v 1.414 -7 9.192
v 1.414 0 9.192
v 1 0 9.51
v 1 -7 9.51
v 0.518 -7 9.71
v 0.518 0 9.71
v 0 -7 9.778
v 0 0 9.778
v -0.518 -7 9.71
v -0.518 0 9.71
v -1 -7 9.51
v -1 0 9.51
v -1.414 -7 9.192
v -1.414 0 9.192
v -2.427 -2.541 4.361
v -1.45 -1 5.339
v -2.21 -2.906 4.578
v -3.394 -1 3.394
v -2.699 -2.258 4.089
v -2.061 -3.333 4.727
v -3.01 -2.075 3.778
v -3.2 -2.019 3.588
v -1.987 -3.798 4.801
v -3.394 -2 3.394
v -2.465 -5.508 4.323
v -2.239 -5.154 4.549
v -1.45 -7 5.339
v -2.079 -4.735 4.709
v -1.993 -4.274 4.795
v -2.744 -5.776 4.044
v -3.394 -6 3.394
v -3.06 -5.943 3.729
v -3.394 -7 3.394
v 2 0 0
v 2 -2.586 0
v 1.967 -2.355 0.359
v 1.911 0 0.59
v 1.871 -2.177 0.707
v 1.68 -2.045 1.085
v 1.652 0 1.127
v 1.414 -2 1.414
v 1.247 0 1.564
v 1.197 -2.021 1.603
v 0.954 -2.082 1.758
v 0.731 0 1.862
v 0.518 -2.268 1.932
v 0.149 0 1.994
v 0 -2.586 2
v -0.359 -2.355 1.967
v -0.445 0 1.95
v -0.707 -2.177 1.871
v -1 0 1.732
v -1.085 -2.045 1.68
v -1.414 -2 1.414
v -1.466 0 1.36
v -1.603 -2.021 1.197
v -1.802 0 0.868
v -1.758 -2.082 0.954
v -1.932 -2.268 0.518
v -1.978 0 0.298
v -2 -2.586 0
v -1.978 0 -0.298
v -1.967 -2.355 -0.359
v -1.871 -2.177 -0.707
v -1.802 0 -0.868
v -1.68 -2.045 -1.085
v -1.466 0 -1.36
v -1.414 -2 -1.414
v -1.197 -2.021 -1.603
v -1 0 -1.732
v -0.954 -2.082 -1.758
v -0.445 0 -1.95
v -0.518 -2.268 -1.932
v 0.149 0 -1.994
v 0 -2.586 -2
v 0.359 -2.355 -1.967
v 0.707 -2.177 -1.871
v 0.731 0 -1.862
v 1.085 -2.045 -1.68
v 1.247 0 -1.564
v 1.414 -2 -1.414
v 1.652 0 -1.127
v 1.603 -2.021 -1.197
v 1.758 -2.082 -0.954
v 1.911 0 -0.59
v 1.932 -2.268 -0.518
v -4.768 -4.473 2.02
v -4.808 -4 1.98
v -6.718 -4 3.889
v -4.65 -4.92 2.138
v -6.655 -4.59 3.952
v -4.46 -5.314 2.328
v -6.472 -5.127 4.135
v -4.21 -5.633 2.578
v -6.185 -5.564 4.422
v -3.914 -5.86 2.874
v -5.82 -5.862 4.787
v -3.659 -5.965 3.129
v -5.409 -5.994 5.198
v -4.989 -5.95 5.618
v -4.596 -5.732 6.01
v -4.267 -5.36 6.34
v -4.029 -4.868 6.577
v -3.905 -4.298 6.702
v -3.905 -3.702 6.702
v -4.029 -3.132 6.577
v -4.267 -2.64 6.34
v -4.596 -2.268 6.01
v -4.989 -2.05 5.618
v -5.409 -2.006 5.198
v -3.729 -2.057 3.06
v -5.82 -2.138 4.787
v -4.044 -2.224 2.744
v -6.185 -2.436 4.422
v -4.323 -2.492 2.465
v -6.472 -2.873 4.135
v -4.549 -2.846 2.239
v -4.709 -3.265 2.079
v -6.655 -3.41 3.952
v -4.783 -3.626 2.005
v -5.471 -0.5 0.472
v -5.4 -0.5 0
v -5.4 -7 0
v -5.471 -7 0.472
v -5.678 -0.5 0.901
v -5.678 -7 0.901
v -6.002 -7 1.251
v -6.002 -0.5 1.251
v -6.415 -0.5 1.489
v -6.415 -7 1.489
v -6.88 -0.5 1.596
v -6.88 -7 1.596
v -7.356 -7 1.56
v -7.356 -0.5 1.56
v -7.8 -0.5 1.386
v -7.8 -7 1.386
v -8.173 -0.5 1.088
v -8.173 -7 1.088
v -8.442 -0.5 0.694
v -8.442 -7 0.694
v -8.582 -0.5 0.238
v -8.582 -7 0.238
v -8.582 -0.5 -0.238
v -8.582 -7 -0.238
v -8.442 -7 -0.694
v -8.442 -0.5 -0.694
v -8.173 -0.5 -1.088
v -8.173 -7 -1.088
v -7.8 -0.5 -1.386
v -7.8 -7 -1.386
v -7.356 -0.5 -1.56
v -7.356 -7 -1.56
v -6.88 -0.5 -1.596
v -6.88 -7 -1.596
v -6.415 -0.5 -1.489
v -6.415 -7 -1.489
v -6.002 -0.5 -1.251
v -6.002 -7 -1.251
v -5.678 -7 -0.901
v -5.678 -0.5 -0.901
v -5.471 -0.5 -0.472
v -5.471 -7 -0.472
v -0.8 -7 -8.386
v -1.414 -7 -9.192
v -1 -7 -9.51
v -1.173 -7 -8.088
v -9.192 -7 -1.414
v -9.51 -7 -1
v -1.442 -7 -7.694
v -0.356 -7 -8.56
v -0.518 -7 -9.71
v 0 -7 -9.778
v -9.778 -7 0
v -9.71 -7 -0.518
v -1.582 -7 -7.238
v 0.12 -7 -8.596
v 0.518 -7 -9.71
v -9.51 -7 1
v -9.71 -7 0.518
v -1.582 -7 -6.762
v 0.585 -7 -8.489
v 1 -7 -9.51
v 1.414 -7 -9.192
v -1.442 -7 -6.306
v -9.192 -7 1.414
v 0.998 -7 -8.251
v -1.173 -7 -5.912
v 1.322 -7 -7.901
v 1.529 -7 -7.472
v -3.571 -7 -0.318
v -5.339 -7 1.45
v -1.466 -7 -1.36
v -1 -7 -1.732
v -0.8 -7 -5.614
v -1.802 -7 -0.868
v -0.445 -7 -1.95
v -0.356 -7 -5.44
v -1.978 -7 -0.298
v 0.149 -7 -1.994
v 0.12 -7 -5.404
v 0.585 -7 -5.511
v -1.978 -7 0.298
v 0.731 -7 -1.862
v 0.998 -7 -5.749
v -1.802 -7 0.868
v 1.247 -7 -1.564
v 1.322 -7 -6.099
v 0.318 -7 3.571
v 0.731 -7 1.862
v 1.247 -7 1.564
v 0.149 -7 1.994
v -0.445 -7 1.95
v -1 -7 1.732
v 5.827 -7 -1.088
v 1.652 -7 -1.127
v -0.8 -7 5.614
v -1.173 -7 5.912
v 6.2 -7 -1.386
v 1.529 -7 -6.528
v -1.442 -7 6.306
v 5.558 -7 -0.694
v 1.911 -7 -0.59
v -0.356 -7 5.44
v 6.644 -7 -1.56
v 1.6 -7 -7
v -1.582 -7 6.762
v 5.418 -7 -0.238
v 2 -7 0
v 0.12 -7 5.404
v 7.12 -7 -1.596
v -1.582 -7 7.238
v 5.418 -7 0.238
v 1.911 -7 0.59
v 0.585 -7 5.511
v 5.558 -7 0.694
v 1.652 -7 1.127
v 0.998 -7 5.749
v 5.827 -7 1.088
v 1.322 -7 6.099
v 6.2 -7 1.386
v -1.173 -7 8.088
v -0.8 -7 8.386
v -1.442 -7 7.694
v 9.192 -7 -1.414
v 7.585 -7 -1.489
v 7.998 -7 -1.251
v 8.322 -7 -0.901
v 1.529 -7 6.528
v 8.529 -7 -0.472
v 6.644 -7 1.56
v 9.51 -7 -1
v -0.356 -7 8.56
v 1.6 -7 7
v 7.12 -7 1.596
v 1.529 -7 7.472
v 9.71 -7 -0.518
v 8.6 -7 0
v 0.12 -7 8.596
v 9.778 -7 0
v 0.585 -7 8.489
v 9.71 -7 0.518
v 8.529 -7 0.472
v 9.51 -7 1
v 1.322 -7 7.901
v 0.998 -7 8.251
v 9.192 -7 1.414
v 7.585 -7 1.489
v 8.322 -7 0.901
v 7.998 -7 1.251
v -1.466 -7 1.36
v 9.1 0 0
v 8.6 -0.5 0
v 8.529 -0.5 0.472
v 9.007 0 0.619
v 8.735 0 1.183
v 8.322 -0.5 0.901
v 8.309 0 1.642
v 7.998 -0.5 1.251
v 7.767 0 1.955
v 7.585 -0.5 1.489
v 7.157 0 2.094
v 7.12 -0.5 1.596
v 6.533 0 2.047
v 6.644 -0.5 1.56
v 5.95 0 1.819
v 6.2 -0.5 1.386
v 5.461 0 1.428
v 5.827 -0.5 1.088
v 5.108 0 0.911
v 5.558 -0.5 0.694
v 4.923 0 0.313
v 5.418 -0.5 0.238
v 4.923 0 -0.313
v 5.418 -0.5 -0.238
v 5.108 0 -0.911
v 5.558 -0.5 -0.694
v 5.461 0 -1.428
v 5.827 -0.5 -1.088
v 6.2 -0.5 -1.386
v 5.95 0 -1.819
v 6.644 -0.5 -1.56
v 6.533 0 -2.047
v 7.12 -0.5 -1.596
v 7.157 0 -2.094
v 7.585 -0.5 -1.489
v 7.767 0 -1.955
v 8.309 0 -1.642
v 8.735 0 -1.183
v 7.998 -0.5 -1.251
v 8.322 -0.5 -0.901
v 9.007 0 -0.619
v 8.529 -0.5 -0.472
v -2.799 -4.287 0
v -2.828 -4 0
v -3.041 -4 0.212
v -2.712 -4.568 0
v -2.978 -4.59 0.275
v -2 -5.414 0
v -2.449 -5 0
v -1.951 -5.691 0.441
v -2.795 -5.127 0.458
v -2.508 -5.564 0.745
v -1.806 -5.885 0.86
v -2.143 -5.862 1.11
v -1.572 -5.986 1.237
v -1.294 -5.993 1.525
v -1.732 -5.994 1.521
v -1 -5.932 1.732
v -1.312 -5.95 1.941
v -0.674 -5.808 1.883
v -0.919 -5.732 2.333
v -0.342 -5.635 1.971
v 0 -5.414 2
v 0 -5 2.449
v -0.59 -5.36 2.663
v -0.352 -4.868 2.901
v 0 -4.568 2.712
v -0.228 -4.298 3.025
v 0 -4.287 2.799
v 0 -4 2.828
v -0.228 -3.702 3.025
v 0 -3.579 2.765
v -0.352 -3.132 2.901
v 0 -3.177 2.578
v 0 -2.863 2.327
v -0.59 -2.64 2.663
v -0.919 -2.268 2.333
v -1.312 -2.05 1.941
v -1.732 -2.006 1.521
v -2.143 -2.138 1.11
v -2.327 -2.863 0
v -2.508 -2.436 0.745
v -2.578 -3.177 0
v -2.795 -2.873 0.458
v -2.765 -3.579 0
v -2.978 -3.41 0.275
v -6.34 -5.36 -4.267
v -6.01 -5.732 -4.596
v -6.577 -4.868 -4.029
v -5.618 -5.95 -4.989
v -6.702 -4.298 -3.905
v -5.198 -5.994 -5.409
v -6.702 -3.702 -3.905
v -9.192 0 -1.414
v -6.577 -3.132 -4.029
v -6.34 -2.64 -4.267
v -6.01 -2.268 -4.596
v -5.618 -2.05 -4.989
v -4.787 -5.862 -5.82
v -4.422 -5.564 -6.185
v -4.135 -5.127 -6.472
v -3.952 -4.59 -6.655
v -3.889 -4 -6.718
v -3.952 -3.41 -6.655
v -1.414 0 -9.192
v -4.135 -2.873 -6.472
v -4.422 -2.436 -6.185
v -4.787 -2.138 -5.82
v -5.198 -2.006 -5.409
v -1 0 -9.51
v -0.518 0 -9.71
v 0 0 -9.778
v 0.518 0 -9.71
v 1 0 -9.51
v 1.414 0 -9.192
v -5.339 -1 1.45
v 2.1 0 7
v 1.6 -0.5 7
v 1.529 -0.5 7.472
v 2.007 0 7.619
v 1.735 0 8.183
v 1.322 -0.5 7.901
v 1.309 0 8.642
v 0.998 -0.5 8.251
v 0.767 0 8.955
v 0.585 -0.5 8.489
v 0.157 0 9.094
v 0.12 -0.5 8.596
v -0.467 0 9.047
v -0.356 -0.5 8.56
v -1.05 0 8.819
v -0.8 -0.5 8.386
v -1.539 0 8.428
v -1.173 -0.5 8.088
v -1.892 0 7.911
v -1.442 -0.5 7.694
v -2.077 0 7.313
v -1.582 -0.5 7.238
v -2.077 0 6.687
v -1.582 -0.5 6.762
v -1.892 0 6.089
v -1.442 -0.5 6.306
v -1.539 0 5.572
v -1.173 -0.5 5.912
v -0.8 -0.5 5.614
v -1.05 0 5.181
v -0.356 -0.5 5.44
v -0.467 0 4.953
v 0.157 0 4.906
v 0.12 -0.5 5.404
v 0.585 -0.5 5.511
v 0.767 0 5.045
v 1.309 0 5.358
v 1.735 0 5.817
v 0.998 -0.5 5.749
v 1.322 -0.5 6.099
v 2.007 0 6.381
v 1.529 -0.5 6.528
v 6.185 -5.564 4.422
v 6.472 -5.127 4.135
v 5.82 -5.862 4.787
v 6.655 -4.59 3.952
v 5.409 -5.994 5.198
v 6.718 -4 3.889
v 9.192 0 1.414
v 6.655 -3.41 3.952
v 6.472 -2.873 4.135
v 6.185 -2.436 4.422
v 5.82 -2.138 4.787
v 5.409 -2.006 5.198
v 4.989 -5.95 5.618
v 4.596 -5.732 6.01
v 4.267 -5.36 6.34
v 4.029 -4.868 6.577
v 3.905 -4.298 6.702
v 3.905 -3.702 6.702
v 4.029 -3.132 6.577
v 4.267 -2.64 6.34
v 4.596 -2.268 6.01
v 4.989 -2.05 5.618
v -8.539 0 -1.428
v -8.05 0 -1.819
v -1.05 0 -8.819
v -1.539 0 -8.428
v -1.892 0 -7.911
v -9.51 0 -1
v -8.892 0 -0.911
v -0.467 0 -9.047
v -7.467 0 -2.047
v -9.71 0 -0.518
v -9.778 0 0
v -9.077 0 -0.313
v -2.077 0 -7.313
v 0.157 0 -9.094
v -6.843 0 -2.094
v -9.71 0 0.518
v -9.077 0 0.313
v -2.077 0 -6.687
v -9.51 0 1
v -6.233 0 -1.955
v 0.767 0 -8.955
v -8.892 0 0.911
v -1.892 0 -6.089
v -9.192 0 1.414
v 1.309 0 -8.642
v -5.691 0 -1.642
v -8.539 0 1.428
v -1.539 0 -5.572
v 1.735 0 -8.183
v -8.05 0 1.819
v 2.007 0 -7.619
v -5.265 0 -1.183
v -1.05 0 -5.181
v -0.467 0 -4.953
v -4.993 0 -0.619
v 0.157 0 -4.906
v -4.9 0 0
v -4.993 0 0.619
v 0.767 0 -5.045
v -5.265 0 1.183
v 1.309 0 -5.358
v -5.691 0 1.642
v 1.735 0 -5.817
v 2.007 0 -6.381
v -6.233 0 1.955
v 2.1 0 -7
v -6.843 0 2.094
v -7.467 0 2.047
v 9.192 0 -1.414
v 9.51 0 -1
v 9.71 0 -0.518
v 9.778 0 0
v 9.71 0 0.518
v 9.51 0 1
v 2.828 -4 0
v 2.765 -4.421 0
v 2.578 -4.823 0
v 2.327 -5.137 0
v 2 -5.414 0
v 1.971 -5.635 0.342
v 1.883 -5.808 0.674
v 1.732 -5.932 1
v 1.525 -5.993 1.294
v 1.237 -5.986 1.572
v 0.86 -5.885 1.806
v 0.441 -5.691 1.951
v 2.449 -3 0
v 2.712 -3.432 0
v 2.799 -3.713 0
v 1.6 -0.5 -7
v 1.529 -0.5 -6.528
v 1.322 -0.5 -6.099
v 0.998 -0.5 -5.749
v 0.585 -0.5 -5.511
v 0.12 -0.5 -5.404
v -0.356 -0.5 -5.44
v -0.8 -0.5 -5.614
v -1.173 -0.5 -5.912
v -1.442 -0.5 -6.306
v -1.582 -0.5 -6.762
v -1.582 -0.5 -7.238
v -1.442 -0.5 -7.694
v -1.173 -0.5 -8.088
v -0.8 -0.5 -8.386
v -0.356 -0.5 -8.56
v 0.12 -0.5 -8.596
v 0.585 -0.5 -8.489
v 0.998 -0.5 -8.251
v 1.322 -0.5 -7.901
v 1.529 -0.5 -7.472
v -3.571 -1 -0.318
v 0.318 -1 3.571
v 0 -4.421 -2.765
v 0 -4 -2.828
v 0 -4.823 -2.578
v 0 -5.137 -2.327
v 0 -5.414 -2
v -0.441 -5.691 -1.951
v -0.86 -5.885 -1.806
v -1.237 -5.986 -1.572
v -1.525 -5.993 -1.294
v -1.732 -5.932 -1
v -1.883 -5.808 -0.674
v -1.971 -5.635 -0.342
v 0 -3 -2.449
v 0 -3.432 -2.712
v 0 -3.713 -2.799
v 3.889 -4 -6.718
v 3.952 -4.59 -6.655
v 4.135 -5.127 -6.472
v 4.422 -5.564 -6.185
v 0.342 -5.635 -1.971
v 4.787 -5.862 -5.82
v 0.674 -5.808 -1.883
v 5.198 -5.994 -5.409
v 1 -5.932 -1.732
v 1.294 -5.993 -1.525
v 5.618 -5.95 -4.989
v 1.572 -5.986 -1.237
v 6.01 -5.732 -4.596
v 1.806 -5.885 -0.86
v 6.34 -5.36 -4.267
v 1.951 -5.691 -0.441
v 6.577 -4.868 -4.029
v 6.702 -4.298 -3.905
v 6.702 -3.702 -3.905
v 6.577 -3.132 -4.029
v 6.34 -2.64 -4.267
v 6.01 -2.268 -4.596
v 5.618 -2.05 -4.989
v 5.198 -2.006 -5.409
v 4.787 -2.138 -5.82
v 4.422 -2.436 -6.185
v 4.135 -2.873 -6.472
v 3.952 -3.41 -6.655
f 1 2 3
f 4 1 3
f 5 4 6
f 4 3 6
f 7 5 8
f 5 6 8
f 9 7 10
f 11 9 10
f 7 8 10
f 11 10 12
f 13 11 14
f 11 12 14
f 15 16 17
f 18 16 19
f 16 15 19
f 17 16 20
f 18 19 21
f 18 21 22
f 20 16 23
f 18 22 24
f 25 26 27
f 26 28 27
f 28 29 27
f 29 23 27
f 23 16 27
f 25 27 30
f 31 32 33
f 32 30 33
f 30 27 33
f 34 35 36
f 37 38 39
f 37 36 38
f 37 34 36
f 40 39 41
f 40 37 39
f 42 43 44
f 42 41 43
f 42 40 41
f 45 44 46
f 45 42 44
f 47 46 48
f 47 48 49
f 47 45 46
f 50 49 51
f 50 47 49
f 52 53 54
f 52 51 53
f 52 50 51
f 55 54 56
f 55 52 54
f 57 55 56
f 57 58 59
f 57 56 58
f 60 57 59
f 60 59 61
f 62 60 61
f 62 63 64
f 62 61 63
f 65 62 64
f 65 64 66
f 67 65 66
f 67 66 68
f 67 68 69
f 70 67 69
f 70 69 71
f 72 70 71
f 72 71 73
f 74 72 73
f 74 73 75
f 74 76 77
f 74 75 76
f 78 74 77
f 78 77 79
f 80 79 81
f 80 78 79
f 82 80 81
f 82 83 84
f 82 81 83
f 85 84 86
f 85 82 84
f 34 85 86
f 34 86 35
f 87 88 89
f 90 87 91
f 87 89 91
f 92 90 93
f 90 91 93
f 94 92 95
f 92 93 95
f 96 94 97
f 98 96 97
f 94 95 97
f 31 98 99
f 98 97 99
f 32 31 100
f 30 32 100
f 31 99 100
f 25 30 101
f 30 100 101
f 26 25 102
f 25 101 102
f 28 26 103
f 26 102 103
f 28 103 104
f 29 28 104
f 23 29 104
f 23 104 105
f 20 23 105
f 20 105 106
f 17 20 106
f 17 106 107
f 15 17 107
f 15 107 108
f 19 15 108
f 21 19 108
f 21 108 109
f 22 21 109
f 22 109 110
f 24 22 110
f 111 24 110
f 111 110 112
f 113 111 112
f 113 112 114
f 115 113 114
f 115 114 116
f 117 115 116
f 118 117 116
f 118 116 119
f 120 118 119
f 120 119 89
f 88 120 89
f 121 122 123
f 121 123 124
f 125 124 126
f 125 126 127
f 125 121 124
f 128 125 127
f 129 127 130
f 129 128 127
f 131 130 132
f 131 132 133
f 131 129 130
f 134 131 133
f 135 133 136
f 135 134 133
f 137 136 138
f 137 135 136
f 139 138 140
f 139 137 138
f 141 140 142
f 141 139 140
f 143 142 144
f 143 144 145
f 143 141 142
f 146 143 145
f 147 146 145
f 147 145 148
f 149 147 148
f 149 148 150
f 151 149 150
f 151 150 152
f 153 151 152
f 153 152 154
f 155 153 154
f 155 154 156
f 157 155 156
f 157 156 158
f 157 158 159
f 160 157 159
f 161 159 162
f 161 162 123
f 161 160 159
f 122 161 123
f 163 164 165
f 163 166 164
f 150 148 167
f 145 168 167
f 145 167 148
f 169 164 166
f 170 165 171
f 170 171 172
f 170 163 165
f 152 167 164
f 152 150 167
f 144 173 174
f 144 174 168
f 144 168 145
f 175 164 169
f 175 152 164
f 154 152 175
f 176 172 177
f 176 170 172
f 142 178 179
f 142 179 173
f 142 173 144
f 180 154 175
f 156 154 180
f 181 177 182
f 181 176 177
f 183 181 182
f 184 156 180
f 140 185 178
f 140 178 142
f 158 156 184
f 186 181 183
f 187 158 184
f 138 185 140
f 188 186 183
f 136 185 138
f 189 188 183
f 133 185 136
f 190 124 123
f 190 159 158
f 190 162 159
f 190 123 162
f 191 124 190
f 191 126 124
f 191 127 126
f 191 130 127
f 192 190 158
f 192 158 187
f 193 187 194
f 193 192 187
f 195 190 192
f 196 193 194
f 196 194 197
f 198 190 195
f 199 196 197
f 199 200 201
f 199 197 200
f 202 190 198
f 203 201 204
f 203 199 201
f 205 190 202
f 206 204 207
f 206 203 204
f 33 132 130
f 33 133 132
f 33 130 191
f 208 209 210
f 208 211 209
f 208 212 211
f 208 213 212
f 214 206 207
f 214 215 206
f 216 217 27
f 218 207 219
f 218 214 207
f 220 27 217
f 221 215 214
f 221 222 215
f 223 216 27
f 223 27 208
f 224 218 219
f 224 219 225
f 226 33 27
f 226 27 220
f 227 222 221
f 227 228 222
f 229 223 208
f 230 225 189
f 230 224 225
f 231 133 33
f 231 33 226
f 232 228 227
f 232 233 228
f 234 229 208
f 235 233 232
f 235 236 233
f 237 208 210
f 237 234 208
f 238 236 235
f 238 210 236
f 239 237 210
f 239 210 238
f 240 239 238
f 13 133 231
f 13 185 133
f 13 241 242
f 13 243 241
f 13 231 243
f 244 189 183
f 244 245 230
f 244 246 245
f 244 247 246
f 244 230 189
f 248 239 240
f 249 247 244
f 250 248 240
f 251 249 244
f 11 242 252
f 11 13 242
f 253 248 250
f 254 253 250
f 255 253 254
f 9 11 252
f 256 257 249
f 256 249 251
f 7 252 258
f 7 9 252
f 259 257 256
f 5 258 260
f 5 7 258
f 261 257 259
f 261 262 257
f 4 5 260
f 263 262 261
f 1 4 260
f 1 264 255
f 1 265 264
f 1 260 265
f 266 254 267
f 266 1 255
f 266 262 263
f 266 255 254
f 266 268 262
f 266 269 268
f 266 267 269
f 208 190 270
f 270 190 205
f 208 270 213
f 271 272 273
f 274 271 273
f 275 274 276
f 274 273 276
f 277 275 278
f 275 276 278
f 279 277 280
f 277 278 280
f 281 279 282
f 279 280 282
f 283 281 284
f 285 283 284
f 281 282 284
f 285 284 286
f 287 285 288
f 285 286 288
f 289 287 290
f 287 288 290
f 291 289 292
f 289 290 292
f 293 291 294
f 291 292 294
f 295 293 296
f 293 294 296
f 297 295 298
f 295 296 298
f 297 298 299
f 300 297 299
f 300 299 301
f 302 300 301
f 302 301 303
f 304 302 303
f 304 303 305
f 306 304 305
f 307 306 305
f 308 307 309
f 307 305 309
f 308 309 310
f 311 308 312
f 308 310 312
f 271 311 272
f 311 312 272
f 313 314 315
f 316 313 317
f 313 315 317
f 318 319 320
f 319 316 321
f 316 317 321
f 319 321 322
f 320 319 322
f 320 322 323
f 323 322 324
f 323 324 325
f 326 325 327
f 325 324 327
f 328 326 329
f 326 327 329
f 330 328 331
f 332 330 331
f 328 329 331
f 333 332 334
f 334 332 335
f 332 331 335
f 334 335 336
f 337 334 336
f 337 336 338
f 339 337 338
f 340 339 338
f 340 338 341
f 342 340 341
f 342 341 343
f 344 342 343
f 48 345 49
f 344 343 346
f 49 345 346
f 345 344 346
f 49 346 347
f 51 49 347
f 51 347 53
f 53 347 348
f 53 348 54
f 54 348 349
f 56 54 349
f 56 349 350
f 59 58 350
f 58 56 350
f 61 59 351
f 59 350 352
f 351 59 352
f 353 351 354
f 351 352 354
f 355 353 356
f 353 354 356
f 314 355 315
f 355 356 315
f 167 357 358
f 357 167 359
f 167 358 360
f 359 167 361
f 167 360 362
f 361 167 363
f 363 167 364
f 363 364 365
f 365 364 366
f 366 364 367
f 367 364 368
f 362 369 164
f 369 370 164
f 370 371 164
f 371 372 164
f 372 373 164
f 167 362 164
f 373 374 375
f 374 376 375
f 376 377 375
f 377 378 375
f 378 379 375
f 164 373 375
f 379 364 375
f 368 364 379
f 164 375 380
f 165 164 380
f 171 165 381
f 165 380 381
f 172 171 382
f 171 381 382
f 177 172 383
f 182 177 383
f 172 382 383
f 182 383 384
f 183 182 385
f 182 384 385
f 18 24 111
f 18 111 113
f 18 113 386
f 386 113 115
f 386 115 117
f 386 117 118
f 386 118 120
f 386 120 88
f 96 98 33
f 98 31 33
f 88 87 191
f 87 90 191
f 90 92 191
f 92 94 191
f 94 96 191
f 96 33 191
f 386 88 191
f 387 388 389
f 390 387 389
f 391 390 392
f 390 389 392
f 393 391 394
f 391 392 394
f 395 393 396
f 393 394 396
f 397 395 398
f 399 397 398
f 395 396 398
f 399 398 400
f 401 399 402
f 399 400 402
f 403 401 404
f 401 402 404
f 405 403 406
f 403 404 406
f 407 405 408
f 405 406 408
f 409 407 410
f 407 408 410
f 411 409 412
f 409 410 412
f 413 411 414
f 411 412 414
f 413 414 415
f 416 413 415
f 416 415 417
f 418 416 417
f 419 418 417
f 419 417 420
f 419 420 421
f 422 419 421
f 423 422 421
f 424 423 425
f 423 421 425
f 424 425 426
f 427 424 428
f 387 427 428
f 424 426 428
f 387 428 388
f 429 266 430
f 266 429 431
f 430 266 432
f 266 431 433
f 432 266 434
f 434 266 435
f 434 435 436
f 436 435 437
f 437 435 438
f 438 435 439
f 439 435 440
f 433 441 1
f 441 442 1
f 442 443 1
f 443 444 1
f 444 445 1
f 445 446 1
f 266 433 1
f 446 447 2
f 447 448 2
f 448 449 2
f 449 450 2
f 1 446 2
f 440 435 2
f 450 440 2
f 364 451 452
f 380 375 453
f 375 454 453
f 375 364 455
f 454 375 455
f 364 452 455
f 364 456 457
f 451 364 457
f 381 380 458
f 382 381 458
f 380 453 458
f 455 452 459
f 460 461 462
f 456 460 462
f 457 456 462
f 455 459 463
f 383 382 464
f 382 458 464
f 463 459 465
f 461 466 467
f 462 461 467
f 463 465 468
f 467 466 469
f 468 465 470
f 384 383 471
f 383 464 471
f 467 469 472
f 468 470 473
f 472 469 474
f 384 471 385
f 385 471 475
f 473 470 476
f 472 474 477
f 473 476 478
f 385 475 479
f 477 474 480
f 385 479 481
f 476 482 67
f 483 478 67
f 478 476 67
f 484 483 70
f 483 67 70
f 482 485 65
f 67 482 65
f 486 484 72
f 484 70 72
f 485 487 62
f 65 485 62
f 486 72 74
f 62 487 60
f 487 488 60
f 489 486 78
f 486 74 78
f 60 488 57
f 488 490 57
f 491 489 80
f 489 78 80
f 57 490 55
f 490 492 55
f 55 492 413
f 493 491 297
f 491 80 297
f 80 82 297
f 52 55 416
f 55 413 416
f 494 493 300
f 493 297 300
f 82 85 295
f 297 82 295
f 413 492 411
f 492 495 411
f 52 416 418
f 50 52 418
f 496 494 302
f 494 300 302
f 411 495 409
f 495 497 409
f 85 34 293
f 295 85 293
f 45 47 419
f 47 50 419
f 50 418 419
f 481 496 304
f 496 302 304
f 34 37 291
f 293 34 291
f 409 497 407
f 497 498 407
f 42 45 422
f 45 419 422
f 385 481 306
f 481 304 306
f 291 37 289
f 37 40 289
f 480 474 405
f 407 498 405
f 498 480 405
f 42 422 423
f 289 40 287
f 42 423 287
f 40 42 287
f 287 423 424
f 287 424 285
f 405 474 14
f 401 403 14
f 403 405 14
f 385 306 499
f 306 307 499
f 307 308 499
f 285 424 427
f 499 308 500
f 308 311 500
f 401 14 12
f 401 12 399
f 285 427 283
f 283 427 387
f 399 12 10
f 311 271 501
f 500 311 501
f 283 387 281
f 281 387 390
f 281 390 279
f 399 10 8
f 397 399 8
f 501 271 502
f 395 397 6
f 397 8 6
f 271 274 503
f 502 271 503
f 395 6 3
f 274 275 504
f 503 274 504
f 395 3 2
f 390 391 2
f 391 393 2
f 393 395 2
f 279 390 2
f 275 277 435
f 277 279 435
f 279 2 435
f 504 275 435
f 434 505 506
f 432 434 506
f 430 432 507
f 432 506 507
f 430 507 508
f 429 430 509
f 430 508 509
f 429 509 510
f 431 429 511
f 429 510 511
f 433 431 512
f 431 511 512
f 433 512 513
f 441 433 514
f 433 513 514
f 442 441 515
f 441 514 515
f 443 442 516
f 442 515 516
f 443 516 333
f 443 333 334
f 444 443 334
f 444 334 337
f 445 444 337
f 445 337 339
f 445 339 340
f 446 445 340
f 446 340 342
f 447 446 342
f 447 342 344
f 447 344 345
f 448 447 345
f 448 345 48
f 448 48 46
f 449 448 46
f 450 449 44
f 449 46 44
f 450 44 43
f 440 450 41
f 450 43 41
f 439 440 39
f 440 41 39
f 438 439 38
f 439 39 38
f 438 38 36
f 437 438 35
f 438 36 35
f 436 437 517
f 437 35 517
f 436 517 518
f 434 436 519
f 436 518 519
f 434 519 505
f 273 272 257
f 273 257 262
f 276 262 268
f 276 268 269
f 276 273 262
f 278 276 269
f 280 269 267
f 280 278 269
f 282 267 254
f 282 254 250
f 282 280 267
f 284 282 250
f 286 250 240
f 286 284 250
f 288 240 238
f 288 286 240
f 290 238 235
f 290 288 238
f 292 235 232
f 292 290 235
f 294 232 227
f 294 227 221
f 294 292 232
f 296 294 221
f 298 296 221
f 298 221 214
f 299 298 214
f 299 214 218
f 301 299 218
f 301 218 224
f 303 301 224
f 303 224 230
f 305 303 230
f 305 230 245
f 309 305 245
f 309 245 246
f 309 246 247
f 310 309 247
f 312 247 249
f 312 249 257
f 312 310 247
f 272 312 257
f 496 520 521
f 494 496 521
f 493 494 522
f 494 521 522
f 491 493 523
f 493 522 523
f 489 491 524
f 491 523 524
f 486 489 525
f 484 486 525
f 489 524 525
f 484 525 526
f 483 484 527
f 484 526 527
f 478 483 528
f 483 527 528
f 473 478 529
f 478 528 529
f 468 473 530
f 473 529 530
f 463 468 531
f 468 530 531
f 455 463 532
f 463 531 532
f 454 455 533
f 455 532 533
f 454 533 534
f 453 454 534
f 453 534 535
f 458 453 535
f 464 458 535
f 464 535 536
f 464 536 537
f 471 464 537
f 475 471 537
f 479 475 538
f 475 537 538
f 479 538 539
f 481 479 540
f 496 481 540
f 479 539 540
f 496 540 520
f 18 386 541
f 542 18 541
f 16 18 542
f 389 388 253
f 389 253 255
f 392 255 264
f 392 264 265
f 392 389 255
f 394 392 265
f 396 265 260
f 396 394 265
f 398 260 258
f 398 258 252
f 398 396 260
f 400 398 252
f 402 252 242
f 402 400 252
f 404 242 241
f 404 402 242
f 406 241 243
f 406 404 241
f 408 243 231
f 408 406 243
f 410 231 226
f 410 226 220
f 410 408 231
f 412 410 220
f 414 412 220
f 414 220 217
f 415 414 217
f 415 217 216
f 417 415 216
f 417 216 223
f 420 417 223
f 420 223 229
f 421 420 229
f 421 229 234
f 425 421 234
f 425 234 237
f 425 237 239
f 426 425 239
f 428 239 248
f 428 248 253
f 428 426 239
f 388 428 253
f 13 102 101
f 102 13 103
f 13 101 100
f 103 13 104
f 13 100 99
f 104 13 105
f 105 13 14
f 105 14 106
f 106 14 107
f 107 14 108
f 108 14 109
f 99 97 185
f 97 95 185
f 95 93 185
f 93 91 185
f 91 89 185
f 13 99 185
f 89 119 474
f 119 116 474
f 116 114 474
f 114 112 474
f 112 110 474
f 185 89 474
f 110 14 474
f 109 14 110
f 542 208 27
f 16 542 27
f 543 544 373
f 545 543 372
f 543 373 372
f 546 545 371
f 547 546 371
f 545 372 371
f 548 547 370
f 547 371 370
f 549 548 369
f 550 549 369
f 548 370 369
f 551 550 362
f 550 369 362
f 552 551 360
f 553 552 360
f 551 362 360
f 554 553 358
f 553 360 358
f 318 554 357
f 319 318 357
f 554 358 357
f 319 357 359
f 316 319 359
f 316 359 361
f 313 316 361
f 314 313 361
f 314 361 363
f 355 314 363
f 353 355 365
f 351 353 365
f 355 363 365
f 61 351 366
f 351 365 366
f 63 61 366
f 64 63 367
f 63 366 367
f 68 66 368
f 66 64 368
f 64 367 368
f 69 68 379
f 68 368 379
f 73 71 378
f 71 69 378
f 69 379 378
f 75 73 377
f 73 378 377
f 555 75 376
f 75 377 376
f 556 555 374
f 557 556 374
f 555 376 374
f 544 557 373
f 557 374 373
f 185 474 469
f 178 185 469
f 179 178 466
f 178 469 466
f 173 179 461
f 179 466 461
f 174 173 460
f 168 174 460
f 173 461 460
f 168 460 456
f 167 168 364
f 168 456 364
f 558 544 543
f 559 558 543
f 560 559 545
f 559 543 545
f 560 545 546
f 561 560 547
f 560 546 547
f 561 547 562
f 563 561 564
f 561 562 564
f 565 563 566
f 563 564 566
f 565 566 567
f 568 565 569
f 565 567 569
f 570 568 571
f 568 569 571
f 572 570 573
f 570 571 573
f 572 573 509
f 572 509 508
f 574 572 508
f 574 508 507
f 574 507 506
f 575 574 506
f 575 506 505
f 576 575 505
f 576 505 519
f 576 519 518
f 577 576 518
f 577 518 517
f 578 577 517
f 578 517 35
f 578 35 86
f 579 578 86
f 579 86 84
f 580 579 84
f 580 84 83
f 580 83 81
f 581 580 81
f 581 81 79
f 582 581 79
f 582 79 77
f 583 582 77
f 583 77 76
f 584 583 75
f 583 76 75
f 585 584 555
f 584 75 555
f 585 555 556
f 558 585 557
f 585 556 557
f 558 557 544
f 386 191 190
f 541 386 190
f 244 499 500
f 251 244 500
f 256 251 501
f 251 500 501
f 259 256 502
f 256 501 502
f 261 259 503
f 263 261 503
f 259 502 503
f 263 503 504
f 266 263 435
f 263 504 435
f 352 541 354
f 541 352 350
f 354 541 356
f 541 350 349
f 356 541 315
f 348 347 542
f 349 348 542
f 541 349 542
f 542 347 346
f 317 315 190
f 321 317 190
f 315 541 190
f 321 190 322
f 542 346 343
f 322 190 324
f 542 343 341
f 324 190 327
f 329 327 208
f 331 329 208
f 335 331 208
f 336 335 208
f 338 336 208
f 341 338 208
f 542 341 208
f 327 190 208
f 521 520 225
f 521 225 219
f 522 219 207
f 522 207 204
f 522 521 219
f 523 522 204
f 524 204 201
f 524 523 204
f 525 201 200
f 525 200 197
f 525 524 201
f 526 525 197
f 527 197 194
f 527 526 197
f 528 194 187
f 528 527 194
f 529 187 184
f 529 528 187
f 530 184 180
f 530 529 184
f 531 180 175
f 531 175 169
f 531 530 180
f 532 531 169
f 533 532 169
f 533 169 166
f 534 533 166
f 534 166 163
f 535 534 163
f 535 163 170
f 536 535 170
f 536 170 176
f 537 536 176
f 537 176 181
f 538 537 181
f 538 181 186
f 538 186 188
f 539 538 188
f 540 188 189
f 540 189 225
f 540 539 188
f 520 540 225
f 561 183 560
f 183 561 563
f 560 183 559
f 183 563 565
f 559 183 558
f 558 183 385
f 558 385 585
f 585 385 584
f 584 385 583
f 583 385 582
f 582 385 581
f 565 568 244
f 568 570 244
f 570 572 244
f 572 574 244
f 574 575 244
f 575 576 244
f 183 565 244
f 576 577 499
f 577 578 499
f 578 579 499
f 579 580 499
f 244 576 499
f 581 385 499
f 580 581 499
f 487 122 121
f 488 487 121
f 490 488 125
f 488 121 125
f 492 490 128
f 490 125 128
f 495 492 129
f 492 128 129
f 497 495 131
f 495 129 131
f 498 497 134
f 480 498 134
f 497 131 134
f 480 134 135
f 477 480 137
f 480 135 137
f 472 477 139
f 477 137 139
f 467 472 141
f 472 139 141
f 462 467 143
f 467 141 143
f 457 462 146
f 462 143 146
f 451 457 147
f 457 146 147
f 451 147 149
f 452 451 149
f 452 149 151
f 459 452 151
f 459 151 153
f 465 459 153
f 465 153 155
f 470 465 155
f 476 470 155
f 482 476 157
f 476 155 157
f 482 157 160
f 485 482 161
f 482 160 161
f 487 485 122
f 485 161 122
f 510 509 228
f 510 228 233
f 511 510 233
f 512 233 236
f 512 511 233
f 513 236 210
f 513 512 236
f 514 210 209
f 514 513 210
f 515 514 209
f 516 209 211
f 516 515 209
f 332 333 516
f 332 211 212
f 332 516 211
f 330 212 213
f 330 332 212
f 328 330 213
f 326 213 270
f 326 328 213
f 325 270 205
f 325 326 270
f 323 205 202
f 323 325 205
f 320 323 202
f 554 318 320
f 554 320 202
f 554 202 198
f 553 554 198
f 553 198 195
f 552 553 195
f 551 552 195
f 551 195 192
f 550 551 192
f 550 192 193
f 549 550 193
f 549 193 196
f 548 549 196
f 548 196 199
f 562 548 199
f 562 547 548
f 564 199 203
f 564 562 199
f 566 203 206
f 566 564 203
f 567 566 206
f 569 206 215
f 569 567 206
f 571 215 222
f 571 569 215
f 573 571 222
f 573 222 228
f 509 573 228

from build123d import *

# Parameters (mm, degrees)
F0_R     = 1.6
F0_R_2   = 2
F1_DEPTH = 7
F2_R     = 2
F3_DEPTH = 25
F4_COUNT = 4
F7_DEPTH = 6
F8_SIZE  = 0.5


with BuildPart() as f1:
    # F0 (on Front) → F1 (new body)
    with BuildSketch(Plane.XZ):
        with BuildLine():
            Line((-9.192388, -1.414214), (-1.414214, -9.192388))
            ThreePointArc((-1.414214, -9.192388), (0, -9.778175), (1.414214, -9.192388))
            Line((1.414214, -9.192388), (9.192388, -1.414214))
            ThreePointArc((9.192388, -1.414214), (9.778175, 0), (9.192388, 1.414214))
            Line((9.192388, 1.414214), (1.414214, 9.192388))
            ThreePointArc((1.414214, 9.192388), (0, 9.778175), (-1.414214, 9.192388))
            Line((-1.414214, 9.192388), (-9.192388, 1.414214))
            ThreePointArc((-9.192388, 1.414214), (-9.778175, 0), (-9.192388, -1.414214))
        make_face()
        with Locations((0, -7)):
            Circle(F0_R, mode=Mode.SUBTRACT)
        with Locations((-7, 0)):
            Circle(F0_R, mode=Mode.SUBTRACT)
        Circle(F0_R_2, mode=Mode.SUBTRACT)
        with Locations((7, 0)):
            Circle(F0_R, mode=Mode.SUBTRACT)
        with Locations((0, 7)):
            Circle(F0_R, mode=Mode.SUBTRACT)
    extrude(amount=F1_DEPTH)


with BuildPart() as f3:
    # F2 (on face) → F3 (new body)
    with BuildSketch(Plane(origin=(-5.303301, 0, -5.303301), x_dir=(0.707107, 0, -0.707107), z_dir=(-0.707107, 0, -0.707107))):
        with Locations((0, 4)):
            Circle(F2_R)
    extrude(amount=-F3_DEPTH)


with BuildPart() as f4_1:
    # F4: instance of F3
    add(f3.part.rotate(Axis((0, 0, 0), (0, 1, 0)), 1 * 360 / F4_COUNT))


with BuildPart() as f4_2:
    # F4: instance of F3
    add(f3.part.rotate(Axis((0, 0, 0), (0, 1, 0)), 2 * 360 / F4_COUNT))


with BuildPart() as f4_3:
    # F4: instance of F3
    add(f3.part.rotate(Axis((0, 0, 0), (0, 1, 0)), 3 * 360 / F4_COUNT))


with BuildPart() as f1_1:
    add(f1.part)

    # F5: cut F3, F4_1, F4_2, F4_3
    add(f3.part, mode=Mode.SUBTRACT)
    add(f4_1.part, mode=Mode.SUBTRACT)
    add(f4_2.part, mode=Mode.SUBTRACT)
    add(f4_3.part, mode=Mode.SUBTRACT)

    # F6 (on face) → F7 (cut)
    with BuildSketch(Plane.XZ.offset(7)):
        Polygon((-1.449569, 5.338656), (-3.394113, 3.394113), (-5.338656, 1.449569), (-3.570889, -0.318198), (0.318198, 3.570889), align=None)
    extrude(amount=-F7_DEPTH, mode=Mode.SUBTRACT)

    # F8
    f8_edges = [f1_1.edges().sort_by_distance(p)[0] for p in [
        (5.4, 0, 0),
        (-1.6, 0, 7),
        (-8.6, 0, 0),
        (-1.6, 0, -7),
    ]]
    chamfer(f8_edges, length=F8_SIZE)


solid = f1_1.part
